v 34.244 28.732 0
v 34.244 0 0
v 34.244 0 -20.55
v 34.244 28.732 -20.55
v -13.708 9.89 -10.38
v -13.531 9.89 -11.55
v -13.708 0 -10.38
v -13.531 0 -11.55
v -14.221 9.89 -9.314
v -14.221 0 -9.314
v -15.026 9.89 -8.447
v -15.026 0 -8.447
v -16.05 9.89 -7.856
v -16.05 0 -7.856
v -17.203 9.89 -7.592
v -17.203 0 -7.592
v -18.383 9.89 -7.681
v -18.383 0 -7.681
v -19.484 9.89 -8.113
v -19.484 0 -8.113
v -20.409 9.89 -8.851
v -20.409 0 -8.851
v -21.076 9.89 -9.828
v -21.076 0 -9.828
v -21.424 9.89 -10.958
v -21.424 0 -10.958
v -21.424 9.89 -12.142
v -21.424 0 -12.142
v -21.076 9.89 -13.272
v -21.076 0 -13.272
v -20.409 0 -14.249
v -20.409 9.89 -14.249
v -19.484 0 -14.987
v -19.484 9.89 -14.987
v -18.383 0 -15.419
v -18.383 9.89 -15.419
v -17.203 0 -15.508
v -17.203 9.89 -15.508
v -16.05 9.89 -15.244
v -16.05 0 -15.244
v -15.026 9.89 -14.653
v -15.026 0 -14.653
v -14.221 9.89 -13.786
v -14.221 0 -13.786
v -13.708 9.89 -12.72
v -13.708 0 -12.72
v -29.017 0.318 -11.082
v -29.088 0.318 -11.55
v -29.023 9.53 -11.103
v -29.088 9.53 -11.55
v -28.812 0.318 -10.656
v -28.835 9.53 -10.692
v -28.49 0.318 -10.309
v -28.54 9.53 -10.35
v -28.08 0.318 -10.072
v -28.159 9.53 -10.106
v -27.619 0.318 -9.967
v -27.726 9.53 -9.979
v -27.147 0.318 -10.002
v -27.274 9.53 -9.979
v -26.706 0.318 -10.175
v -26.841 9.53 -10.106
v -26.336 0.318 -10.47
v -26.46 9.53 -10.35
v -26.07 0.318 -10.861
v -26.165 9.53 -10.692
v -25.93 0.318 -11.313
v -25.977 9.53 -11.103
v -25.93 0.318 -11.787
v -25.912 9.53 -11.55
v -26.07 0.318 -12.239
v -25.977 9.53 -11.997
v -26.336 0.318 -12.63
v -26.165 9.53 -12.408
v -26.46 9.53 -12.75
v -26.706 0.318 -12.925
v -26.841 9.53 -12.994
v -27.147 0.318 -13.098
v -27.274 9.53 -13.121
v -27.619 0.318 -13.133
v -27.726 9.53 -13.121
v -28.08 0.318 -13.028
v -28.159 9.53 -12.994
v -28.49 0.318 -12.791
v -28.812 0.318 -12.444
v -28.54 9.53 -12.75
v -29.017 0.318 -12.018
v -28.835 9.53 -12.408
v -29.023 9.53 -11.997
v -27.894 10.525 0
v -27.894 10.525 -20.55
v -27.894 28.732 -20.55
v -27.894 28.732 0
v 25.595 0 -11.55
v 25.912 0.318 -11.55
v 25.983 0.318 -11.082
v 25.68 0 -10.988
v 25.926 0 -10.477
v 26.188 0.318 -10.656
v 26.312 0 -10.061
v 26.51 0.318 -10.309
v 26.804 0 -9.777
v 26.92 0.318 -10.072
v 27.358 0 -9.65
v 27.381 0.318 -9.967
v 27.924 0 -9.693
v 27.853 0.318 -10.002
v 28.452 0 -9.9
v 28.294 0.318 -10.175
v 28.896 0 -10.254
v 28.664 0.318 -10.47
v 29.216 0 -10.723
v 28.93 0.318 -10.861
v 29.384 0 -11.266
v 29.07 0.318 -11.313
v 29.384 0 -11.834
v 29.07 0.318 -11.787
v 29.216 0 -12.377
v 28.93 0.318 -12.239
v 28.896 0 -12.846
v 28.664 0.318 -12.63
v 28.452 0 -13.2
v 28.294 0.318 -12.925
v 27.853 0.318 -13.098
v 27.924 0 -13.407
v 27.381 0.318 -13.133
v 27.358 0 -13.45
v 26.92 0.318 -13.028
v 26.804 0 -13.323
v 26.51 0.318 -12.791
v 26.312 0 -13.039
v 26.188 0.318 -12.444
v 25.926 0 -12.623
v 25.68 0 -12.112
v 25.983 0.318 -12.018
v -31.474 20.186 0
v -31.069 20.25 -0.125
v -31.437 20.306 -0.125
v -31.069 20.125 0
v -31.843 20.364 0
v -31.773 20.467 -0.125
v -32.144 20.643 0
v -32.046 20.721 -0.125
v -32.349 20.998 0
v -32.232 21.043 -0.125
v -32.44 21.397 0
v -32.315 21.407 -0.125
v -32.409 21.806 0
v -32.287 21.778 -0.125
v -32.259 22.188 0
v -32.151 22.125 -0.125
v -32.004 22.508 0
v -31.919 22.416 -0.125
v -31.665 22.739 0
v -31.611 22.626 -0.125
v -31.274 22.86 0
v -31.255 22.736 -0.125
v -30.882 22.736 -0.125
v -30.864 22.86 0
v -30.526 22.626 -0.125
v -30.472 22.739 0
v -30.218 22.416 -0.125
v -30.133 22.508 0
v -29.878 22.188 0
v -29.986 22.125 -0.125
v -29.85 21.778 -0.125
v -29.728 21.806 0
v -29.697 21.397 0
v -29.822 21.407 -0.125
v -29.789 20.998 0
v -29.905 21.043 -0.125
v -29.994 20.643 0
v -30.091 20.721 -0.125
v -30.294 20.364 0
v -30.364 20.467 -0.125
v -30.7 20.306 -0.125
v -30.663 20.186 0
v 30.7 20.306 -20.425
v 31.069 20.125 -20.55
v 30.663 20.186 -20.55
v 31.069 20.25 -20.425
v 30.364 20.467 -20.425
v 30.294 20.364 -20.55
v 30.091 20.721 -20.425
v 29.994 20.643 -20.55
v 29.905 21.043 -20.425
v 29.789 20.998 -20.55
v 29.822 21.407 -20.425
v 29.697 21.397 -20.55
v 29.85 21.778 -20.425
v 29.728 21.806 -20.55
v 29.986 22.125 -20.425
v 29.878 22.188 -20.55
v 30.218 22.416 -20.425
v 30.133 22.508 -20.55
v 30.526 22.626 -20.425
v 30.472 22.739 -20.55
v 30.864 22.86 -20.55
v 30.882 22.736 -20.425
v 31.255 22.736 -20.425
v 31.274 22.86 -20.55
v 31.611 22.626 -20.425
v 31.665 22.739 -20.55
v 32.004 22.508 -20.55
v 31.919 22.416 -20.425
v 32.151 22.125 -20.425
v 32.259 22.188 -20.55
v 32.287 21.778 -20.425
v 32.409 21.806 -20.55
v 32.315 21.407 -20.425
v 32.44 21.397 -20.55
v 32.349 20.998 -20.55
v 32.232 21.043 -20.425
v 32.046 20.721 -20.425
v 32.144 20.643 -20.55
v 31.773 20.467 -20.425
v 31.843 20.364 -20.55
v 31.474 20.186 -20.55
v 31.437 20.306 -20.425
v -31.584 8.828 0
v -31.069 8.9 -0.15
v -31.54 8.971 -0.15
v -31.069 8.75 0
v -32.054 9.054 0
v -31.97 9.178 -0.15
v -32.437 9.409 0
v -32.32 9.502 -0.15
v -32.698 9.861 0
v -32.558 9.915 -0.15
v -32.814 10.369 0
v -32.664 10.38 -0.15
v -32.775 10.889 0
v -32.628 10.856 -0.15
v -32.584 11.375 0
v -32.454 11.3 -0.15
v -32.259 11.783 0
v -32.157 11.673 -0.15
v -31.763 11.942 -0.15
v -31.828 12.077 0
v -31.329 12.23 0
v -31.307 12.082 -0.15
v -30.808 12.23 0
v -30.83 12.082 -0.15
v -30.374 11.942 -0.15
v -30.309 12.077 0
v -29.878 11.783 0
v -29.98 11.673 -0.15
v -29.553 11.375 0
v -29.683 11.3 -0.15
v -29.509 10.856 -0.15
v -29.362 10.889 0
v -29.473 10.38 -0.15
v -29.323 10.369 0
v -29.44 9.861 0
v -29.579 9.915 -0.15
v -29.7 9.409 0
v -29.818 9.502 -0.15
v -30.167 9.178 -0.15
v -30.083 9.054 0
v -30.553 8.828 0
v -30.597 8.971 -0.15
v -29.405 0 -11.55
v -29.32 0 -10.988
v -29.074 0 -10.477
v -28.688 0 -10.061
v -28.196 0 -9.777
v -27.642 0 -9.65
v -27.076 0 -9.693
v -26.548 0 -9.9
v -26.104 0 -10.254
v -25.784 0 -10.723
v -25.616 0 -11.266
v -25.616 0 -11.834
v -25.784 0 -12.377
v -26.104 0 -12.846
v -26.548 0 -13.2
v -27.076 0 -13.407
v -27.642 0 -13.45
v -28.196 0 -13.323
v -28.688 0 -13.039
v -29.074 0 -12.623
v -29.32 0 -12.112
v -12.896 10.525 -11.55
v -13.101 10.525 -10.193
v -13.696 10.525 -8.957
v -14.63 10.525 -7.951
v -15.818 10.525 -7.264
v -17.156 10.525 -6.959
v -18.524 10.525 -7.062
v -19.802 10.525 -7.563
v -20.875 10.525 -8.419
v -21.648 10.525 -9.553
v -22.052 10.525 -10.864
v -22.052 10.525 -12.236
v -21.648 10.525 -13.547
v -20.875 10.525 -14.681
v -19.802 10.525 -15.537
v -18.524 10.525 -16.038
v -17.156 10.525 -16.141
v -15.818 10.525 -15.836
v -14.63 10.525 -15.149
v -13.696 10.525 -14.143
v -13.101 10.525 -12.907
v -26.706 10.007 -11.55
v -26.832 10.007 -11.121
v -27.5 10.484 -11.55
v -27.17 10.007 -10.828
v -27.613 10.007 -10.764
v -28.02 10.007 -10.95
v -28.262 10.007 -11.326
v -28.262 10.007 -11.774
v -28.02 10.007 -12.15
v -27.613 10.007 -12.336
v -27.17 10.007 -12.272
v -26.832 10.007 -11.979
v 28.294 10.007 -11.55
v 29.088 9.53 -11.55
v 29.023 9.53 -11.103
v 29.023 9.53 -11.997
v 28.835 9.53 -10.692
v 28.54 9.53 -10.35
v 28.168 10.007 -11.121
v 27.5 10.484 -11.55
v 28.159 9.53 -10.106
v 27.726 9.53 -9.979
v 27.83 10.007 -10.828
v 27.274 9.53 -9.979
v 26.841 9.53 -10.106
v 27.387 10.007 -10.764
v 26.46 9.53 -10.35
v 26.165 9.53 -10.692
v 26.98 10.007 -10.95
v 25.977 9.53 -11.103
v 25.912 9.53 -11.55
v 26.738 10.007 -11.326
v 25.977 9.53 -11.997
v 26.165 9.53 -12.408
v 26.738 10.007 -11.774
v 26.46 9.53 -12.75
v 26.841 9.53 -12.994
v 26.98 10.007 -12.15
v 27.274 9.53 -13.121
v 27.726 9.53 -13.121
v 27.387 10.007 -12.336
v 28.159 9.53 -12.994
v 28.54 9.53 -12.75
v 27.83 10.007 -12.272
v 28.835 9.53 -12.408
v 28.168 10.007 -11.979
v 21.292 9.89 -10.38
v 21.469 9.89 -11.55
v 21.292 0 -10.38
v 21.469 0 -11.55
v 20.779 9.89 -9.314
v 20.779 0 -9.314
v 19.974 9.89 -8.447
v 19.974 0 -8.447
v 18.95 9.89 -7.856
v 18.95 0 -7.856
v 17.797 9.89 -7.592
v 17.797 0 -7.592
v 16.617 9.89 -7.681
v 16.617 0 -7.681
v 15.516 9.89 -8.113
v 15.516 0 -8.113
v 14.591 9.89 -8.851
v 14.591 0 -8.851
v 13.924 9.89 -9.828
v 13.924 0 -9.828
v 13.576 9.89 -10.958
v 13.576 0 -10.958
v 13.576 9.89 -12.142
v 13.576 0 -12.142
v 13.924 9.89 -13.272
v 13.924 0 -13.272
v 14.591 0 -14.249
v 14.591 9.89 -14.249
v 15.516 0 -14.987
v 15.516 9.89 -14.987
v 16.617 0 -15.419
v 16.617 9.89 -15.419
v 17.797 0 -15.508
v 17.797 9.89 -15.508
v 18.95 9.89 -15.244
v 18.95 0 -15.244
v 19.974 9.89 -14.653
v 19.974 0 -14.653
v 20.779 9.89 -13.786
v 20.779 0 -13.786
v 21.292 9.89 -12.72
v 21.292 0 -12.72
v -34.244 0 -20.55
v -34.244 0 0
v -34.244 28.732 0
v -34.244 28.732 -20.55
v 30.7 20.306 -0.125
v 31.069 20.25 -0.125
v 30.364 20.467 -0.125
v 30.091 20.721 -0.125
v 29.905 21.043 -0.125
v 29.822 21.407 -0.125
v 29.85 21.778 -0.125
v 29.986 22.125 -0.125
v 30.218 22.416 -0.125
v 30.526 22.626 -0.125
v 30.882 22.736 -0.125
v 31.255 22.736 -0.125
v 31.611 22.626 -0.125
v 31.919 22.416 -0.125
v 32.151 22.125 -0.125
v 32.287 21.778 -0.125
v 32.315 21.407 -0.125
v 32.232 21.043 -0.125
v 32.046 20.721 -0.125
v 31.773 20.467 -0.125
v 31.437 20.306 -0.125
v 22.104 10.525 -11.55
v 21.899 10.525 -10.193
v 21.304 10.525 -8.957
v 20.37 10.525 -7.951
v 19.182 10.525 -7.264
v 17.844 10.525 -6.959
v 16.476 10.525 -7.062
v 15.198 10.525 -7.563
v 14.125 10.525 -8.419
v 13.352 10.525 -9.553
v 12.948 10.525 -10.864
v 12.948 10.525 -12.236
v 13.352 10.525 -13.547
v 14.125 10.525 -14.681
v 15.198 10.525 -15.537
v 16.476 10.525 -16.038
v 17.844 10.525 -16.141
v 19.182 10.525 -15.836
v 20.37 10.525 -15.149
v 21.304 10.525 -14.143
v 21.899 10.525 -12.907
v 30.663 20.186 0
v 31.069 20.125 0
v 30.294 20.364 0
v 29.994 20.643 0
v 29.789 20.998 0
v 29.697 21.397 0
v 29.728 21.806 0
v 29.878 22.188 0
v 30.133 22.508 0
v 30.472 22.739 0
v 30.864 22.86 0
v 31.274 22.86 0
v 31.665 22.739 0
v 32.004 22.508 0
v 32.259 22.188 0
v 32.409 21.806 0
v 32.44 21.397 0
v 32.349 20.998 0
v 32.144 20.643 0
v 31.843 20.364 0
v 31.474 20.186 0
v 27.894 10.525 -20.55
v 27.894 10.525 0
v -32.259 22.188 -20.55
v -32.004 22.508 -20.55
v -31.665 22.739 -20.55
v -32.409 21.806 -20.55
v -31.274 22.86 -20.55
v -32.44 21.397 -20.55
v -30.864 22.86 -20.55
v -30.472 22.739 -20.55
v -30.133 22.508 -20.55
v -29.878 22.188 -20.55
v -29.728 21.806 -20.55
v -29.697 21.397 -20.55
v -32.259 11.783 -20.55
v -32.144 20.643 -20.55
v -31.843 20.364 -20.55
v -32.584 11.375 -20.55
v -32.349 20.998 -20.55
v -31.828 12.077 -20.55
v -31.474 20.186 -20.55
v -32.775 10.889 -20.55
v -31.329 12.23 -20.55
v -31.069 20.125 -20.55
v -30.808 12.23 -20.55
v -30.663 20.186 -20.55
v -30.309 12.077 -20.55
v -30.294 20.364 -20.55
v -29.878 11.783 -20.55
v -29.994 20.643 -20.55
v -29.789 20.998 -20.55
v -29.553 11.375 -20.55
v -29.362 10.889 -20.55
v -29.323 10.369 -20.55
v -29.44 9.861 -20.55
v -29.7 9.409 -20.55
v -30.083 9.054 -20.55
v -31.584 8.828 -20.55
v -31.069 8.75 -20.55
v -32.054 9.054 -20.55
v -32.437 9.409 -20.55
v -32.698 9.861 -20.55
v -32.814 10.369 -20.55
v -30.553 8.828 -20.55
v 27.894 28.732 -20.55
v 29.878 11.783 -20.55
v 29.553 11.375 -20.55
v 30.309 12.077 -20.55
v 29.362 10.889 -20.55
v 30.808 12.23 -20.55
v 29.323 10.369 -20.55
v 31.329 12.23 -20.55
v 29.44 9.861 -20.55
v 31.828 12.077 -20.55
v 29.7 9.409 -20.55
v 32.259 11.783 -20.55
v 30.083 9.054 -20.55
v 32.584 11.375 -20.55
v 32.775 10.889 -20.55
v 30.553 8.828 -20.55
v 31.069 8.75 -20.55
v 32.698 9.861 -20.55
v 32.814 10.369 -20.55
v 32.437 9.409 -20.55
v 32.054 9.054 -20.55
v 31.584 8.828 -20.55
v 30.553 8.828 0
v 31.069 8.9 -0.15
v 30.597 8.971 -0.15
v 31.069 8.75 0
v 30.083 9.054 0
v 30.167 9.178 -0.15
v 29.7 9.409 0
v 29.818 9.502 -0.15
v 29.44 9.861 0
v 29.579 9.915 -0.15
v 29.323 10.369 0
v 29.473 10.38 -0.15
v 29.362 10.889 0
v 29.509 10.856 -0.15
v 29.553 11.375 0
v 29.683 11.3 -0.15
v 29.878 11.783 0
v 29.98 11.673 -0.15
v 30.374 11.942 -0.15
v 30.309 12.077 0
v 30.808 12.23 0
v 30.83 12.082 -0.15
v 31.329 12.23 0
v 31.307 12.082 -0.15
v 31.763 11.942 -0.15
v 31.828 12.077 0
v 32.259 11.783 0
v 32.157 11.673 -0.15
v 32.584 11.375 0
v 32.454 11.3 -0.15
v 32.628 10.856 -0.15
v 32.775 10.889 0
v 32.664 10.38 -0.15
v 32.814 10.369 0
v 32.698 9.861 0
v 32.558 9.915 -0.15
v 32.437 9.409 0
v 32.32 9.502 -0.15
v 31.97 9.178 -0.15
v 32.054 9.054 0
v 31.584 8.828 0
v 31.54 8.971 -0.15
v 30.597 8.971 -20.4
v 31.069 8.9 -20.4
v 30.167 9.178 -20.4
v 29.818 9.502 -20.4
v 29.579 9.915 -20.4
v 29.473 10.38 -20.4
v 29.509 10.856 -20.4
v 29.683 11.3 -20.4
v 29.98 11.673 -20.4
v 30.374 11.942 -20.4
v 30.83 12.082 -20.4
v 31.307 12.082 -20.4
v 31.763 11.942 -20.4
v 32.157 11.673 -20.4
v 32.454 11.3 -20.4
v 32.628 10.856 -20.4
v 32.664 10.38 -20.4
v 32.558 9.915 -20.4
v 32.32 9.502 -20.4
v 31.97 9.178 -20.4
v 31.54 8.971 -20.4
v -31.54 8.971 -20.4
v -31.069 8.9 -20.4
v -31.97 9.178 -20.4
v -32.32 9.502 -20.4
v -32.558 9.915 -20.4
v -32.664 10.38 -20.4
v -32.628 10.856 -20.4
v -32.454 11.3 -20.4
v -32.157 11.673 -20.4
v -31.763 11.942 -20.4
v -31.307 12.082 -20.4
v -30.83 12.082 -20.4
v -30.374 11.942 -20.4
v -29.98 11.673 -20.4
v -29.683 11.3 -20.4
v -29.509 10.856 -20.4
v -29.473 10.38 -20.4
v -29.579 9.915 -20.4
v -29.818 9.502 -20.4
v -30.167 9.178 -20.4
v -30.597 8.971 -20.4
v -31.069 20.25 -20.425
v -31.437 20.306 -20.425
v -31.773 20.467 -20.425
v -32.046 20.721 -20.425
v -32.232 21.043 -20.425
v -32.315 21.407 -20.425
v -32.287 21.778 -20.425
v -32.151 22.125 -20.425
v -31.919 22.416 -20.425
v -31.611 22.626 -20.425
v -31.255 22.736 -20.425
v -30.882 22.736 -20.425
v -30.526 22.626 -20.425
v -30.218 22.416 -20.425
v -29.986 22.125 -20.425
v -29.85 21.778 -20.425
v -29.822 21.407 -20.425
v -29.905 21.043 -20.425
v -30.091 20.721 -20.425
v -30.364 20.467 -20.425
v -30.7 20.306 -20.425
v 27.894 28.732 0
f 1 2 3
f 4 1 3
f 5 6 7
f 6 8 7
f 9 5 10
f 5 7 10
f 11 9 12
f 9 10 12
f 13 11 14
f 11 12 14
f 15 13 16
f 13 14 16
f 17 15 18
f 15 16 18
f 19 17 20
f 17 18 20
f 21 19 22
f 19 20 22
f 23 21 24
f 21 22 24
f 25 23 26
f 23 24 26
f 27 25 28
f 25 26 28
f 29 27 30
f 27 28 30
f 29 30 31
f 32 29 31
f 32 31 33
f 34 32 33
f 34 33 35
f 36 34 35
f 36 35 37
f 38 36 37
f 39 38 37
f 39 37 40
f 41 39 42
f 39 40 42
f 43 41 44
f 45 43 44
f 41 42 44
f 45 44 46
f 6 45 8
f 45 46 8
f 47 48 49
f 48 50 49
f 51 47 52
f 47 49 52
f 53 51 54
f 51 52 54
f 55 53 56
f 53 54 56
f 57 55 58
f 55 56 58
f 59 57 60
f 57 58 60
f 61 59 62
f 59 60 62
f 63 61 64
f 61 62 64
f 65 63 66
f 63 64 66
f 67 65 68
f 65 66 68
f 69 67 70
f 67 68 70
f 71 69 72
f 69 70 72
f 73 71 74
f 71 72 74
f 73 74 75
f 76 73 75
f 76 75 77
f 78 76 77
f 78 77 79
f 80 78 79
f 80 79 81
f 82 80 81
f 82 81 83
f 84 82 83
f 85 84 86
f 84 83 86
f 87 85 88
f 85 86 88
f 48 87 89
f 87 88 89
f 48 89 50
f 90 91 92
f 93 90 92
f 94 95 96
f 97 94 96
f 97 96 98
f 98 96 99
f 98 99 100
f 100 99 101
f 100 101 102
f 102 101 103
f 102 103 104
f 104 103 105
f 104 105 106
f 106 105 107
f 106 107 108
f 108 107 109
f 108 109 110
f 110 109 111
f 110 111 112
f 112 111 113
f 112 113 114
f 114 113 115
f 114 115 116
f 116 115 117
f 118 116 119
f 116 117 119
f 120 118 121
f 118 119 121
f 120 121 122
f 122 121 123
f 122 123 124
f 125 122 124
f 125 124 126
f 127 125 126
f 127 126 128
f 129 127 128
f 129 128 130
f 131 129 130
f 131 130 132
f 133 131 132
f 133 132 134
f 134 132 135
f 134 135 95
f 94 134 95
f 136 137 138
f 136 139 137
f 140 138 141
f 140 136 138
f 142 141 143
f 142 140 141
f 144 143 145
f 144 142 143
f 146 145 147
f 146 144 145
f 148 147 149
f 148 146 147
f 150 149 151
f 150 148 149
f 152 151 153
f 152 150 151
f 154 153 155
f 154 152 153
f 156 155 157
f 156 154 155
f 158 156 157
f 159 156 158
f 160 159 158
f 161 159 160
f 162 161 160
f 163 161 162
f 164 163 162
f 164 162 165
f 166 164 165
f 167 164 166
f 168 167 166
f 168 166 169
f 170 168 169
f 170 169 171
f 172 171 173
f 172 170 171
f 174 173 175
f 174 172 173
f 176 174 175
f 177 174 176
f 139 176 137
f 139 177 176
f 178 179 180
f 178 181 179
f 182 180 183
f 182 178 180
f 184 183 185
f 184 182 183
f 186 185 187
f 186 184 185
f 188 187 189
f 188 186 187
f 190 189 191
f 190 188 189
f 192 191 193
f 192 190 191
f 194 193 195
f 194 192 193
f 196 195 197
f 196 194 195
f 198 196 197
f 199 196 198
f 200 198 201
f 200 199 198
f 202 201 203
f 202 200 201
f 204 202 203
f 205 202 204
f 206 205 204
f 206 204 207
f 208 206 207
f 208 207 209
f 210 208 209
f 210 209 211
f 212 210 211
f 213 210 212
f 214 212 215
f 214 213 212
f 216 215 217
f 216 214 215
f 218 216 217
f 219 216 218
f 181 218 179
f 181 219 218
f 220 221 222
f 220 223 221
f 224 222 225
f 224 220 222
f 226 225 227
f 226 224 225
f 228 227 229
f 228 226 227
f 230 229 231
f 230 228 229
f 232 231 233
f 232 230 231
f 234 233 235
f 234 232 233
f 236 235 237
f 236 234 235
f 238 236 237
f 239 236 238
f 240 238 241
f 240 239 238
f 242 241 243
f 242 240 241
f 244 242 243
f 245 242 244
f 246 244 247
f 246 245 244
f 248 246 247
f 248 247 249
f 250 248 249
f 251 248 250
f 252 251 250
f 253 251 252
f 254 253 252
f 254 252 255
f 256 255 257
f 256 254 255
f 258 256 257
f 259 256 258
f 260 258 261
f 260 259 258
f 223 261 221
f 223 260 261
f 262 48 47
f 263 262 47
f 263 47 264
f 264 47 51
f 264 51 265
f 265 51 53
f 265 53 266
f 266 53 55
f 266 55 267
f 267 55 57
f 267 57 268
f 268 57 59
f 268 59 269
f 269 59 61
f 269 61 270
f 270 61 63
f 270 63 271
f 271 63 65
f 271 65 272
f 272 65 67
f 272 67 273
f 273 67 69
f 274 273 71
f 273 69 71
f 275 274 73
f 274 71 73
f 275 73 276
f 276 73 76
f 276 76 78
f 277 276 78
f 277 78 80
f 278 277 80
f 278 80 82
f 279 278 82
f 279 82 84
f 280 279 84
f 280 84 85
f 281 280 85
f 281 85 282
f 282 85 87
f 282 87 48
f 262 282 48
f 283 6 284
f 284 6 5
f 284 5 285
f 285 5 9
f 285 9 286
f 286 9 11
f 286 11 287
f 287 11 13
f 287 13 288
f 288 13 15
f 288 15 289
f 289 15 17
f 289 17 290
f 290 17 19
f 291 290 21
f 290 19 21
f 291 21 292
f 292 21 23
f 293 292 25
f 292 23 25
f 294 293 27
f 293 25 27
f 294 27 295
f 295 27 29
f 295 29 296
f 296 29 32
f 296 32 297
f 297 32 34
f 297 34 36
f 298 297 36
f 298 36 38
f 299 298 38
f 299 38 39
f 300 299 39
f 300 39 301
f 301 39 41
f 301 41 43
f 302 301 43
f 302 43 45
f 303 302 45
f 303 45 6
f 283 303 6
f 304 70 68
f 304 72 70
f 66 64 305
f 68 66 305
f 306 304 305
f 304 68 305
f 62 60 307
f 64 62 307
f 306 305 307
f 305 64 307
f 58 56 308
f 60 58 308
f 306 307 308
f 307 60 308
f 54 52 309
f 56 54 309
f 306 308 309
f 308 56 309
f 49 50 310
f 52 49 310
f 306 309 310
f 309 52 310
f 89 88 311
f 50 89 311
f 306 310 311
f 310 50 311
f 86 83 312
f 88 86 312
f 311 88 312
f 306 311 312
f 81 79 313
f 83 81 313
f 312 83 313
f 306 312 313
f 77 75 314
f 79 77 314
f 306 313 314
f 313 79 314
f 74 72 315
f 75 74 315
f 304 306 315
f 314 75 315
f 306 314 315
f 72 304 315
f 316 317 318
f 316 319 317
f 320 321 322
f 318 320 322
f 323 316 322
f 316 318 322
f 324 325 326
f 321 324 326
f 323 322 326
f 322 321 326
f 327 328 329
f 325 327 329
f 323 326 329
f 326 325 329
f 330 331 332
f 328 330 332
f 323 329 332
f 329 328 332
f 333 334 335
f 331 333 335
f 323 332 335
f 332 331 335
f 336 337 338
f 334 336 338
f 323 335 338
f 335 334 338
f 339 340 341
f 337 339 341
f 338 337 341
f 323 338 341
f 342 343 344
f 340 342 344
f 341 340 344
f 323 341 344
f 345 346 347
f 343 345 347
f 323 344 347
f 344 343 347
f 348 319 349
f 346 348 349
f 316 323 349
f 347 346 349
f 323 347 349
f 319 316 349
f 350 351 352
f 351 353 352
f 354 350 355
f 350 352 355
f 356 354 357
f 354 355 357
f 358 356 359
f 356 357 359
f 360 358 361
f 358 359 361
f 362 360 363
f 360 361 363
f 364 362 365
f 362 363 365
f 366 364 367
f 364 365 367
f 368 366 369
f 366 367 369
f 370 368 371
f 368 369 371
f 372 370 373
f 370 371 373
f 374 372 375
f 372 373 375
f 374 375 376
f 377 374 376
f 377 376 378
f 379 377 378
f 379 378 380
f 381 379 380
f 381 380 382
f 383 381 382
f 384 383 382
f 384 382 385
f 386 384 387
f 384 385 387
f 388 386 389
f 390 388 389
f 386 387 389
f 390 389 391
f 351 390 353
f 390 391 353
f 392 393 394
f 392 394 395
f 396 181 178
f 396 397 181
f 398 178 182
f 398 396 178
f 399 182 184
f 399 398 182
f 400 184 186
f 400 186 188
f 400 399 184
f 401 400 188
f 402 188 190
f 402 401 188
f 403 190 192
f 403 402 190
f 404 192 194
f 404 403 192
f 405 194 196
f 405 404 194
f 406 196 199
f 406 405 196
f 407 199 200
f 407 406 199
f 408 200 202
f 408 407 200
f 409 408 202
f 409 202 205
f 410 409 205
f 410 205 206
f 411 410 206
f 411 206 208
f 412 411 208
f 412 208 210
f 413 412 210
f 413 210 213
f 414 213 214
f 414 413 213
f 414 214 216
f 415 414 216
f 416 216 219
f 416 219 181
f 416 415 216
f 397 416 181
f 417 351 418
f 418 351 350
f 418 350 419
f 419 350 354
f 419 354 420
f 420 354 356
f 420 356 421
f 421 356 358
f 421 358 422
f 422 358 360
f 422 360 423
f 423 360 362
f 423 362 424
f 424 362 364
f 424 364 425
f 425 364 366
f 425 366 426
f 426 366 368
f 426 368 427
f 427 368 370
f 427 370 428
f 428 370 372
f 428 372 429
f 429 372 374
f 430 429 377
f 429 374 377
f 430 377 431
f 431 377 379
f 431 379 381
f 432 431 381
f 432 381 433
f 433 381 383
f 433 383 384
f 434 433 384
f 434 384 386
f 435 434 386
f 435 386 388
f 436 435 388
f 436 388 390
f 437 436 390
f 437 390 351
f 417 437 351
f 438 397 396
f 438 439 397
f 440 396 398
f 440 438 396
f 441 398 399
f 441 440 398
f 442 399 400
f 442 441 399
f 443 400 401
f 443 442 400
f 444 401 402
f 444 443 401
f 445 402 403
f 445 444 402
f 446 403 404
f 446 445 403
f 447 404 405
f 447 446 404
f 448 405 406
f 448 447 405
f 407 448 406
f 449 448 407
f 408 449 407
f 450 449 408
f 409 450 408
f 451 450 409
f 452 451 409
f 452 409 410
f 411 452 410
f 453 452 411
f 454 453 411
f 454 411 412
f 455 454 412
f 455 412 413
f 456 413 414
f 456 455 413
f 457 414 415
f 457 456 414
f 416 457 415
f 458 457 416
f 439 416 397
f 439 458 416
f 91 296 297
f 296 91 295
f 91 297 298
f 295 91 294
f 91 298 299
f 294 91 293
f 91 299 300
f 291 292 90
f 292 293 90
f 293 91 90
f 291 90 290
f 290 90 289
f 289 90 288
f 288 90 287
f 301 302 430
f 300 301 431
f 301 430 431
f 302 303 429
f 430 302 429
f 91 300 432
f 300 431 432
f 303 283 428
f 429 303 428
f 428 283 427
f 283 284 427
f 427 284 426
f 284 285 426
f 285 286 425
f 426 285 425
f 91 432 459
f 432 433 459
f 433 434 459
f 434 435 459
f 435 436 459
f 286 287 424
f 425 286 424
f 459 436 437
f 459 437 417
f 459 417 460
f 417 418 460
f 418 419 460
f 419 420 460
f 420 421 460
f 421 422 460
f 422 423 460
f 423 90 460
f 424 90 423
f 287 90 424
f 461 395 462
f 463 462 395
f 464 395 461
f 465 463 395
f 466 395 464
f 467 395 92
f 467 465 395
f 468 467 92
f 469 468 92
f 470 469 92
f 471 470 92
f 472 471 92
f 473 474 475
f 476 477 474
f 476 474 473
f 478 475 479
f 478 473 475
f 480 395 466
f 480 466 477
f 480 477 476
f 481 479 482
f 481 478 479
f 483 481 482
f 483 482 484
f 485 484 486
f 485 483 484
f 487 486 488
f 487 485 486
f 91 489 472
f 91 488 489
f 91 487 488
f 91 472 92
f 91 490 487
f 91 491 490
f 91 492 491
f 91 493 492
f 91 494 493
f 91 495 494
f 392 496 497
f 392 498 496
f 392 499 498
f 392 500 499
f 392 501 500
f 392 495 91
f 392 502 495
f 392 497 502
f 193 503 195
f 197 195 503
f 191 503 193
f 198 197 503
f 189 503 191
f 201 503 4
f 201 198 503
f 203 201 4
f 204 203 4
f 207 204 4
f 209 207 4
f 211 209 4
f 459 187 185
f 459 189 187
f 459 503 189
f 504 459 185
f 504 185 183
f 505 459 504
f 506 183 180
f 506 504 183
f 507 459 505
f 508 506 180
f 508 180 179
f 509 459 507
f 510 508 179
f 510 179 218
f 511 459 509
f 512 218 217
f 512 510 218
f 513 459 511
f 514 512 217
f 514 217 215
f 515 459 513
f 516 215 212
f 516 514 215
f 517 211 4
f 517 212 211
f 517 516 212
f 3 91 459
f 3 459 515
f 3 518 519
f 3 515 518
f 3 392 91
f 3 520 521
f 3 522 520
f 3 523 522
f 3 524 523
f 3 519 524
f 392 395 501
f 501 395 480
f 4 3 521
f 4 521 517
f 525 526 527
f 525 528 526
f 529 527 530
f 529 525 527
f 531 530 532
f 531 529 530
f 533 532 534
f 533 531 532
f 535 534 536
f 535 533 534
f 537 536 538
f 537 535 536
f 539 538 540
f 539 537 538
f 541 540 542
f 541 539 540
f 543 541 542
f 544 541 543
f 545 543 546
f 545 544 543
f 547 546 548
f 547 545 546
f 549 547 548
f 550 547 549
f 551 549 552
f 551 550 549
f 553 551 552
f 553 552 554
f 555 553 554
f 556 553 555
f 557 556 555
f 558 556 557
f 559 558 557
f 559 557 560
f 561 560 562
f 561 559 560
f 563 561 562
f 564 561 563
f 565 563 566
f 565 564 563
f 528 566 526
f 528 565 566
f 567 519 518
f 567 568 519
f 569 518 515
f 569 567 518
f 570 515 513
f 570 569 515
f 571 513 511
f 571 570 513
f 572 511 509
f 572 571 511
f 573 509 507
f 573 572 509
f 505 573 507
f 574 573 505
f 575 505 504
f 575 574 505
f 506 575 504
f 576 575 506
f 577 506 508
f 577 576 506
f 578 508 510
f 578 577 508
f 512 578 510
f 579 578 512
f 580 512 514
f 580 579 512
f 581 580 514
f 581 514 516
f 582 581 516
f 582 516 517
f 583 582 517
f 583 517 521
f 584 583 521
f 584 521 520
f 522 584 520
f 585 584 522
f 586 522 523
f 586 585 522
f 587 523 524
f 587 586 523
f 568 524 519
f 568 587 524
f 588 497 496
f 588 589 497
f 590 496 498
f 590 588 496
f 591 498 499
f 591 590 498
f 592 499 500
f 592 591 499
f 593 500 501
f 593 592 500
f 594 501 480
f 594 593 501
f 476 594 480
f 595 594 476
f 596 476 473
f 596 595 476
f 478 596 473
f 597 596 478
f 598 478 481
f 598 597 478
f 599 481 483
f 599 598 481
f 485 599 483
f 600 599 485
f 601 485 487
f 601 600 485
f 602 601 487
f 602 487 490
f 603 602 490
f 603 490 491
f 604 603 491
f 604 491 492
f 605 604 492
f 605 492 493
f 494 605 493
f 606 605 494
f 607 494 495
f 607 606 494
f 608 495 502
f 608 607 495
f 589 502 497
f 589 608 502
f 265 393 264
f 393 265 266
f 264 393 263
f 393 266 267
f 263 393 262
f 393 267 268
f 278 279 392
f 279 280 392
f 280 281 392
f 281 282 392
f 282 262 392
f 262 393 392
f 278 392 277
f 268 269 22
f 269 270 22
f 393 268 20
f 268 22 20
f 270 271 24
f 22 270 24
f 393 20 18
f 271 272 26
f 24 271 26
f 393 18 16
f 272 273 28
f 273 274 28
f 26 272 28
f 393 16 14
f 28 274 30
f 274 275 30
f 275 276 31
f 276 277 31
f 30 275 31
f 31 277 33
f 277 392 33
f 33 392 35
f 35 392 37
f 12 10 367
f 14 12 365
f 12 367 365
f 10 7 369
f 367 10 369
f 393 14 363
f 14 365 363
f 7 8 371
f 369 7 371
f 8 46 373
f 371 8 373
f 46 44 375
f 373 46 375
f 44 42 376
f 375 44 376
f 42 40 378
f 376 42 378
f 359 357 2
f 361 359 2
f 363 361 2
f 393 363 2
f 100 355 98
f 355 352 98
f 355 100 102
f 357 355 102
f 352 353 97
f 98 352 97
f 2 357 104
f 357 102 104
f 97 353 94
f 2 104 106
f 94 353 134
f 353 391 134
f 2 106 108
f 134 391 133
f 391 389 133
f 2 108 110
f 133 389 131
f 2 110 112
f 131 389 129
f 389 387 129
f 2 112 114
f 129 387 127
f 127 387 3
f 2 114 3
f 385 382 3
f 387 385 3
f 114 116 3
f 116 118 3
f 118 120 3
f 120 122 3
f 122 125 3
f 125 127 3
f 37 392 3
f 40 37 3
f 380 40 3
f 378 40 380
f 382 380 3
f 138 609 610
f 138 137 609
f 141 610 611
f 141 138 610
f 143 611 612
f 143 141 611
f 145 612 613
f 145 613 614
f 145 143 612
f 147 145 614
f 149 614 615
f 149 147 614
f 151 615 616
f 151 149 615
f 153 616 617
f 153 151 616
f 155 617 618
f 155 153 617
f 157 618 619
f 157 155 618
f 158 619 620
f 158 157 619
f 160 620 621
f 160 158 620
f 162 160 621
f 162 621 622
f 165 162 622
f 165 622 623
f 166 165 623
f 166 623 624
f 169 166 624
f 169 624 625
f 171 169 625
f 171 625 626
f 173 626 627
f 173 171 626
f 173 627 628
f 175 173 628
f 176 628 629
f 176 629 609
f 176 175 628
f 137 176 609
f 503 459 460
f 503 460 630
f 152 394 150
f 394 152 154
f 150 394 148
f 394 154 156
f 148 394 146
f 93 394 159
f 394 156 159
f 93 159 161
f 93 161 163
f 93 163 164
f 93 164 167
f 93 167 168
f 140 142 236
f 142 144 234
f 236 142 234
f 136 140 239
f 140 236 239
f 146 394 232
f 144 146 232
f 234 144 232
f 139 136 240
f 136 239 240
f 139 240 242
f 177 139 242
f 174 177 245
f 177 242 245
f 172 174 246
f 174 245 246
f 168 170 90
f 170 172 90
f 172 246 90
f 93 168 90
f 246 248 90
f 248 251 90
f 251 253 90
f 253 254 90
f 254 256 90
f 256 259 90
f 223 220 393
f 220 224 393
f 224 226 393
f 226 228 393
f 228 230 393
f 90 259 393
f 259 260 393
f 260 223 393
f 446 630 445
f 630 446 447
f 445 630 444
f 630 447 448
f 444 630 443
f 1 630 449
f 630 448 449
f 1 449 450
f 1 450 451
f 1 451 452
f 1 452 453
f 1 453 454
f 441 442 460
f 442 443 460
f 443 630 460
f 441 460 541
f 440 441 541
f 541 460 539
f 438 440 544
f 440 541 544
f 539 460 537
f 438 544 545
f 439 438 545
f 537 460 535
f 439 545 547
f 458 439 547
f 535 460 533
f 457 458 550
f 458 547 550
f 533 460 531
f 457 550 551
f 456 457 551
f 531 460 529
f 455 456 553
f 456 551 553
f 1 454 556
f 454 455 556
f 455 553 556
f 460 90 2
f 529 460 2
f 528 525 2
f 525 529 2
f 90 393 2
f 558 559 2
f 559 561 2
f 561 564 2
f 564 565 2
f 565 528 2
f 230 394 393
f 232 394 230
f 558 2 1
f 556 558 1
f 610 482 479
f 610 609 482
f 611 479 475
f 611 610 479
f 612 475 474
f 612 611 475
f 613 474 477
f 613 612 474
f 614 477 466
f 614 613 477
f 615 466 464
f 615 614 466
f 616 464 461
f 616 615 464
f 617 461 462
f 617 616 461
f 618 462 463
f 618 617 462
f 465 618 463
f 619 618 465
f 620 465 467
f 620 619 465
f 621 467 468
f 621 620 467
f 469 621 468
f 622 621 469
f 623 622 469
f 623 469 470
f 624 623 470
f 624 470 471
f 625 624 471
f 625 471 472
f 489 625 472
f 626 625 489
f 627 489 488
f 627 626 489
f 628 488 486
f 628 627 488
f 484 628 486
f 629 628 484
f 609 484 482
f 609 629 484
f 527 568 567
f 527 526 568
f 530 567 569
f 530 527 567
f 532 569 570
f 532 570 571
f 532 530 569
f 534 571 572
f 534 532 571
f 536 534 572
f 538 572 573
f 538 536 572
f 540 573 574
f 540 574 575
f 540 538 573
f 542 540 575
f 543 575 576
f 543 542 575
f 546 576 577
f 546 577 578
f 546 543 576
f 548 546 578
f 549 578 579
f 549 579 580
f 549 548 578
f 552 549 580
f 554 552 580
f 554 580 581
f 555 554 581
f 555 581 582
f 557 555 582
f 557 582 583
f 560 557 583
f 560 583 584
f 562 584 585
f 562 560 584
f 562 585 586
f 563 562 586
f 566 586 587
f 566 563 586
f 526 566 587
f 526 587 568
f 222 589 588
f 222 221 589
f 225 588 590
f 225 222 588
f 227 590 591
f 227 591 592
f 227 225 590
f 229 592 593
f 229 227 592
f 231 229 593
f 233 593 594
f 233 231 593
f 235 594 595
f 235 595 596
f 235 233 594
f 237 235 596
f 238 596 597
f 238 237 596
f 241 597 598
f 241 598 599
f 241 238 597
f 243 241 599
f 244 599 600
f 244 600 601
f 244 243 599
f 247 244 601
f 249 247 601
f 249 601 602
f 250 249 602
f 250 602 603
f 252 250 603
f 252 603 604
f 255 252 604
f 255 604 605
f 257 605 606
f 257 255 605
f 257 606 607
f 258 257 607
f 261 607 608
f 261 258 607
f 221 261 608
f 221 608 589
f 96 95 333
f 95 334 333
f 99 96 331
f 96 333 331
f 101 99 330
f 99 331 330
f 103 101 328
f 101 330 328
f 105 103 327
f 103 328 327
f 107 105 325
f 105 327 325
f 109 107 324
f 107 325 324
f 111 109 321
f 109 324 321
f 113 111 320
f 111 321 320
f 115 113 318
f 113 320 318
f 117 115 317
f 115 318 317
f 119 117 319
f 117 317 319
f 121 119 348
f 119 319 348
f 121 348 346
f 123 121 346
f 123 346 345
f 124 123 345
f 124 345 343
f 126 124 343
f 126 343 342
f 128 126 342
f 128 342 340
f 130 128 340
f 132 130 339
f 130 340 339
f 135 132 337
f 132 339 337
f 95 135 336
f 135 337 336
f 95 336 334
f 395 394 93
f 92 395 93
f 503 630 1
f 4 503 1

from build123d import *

# Parameters (mm, degrees)
SKETCH1_W                                = 68.4872
SKETCH1_H                                = 20.55
BOSS_EXTRUDE1_DEPTH                      = 28.732
SKETCH2_W                                = 55.7872
SKETCH2_H                                = 18.207
CUT_EXTRUDE1_DEPTH                       = 21.55
F_2_5_2_5_DIAMETER_HOLE1_AT_2_COUNT      = 2
F_2_5_2_5_DIAMETER_HOLE1_AT_2_PITCH      = 62.1372
F_3_2_3_2_DIAMETER_HOLE1_AT_2_COUNT      = 2
F_3_2_3_2_DIAMETER_HOLE1_AT_2_PITCH      = 62.1372
F_5_16_0_3125_DIAMETER_HOLE1_D           = 7.9375
F_5_16_0_3125_DIAMETER_HOLE1_CSINK_D     = 9.2075
F_5_16_0_3125_DIAMETER_HOLE1_CSINK_ANGLE = 90
F_1_8_0_125_DIAMETER_HOLE1_D             = 3.175
F_1_8_0_125_DIAMETER_HOLE1_DEPTH         = 9.53
F_1_8_0_125_DIAMETER_HOLE1_CSINK_D       = 3.81
F_1_8_0_125_DIAMETER_HOLE1_CSINK_ANGLE   = 90
F_1_8_0_125_DIAMETER_HOLE1_TIP           = 0.953866233


with BuildPart() as part:
    # Sketch1 → Boss-Extrude1 (new body)
    with BuildSketch(Plane(origin=(0, 0, 0), x_dir=(1, 0, 0), z_dir=(0, 1, 0))):
        with Locations((0, 10.275)):
            Rectangle(SKETCH1_W, SKETCH1_H)
    extrude(amount=BOSS_EXTRUDE1_DEPTH)

    # Sketch2 → Cut-Extrude1 (cut, through all)
    with BuildSketch(Plane.XY):
        with Locations((0, 19.6285)):
            Rectangle(SKETCH2_W, SKETCH2_H)
    extrude(amount=-CUT_EXTRUDE1_DEPTH, mode=Mode.SUBTRACT)

    # Sketch5 → Ø2.5 (2.5) Diameter Hole1 (revolve, cut)
    with BuildSketch(Plane(origin=(-31.0686, 21.5, 0), x_dir=(0, -1, 0), z_dir=(1, 0, 0))):
        Polygon((0, 0), (0, 20.55), (1.375, 20.55), (1.25, 20.425), (1.25, 0.125), (1.375, 0), align=None)
    f_2_5_2_5_diameter_hole1 = revolve(axis=Axis((-31.0686, 21.5, 6.35), (0, 0, -1)), mode=Mode.SUBTRACT)

    # Ø2.5 (2.5) Diameter Hole1 at 2: Ø2.5 (2.5) Diameter Hole1 ×2
    with Locations(*[(i * F_2_5_2_5_DIAMETER_HOLE1_AT_2_PITCH, 0, 0) for i in range(1, F_2_5_2_5_DIAMETER_HOLE1_AT_2_COUNT)]):
        add(f_2_5_2_5_diameter_hole1, mode=Mode.SUBTRACT)

    # Sketch8 → Ø3.2 (3.2) Diameter Hole1 (revolve, cut)
    with BuildSketch(Plane(origin=(-31.0686, 10.5, 0), x_dir=(0, -1, 0), z_dir=(1, 0, 0))):
        Polygon((0, 0), (0, 20.55), (1.75, 20.55), (1.6, 20.4), (1.6, 0.15), (1.75, 0), align=None)
    f_3_2_3_2_diameter_hole1 = revolve(axis=Axis((-31.0686, 10.5, 6.35), (0, 0, -1)), mode=Mode.SUBTRACT)

    # Ø3.2 (3.2) Diameter Hole1 at 2: Ø3.2 (3.2) Diameter Hole1 ×2
    with Locations(*[(i * F_3_2_3_2_DIAMETER_HOLE1_AT_2_PITCH, 0, 0) for i in range(1, F_3_2_3_2_DIAMETER_HOLE1_AT_2_COUNT)]):
        add(f_3_2_3_2_diameter_hole1, mode=Mode.SUBTRACT)

    # 5/16 (0.3125) Diameter Hole1 (through all)
    with Locations(Plane(origin=(0, 10.525, 0), x_dir=(-1, 0, 0), z_dir=(0, 1, 0))):
        with Locations((17.5, -11.55), (-17.5, -11.55)):
            CounterSinkHole(F_5_16_0_3125_DIAMETER_HOLE1_D / 2, F_5_16_0_3125_DIAMETER_HOLE1_CSINK_D / 2, counter_sink_angle=F_5_16_0_3125_DIAMETER_HOLE1_CSINK_ANGLE)

    # 1/8 (0.125) Diameter Hole1
    with Locations(Plane.XZ):
        with Locations((27.5, -11.55), (-27.5, -11.55)):
            CounterSinkHole(F_1_8_0_125_DIAMETER_HOLE1_D / 2, F_1_8_0_125_DIAMETER_HOLE1_CSINK_D / 2, depth=F_1_8_0_125_DIAMETER_HOLE1_DEPTH, counter_sink_angle=F_1_8_0_125_DIAMETER_HOLE1_CSINK_ANGLE)
            with Locations((0, 0, -(F_1_8_0_125_DIAMETER_HOLE1_DEPTH + F_1_8_0_125_DIAMETER_HOLE1_TIP / 2))):  # 118° drill point
                Cone(0, F_1_8_0_125_DIAMETER_HOLE1_D / 2, F_1_8_0_125_DIAMETER_HOLE1_TIP, mode=Mode.SUBTRACT)


solid = part.part
